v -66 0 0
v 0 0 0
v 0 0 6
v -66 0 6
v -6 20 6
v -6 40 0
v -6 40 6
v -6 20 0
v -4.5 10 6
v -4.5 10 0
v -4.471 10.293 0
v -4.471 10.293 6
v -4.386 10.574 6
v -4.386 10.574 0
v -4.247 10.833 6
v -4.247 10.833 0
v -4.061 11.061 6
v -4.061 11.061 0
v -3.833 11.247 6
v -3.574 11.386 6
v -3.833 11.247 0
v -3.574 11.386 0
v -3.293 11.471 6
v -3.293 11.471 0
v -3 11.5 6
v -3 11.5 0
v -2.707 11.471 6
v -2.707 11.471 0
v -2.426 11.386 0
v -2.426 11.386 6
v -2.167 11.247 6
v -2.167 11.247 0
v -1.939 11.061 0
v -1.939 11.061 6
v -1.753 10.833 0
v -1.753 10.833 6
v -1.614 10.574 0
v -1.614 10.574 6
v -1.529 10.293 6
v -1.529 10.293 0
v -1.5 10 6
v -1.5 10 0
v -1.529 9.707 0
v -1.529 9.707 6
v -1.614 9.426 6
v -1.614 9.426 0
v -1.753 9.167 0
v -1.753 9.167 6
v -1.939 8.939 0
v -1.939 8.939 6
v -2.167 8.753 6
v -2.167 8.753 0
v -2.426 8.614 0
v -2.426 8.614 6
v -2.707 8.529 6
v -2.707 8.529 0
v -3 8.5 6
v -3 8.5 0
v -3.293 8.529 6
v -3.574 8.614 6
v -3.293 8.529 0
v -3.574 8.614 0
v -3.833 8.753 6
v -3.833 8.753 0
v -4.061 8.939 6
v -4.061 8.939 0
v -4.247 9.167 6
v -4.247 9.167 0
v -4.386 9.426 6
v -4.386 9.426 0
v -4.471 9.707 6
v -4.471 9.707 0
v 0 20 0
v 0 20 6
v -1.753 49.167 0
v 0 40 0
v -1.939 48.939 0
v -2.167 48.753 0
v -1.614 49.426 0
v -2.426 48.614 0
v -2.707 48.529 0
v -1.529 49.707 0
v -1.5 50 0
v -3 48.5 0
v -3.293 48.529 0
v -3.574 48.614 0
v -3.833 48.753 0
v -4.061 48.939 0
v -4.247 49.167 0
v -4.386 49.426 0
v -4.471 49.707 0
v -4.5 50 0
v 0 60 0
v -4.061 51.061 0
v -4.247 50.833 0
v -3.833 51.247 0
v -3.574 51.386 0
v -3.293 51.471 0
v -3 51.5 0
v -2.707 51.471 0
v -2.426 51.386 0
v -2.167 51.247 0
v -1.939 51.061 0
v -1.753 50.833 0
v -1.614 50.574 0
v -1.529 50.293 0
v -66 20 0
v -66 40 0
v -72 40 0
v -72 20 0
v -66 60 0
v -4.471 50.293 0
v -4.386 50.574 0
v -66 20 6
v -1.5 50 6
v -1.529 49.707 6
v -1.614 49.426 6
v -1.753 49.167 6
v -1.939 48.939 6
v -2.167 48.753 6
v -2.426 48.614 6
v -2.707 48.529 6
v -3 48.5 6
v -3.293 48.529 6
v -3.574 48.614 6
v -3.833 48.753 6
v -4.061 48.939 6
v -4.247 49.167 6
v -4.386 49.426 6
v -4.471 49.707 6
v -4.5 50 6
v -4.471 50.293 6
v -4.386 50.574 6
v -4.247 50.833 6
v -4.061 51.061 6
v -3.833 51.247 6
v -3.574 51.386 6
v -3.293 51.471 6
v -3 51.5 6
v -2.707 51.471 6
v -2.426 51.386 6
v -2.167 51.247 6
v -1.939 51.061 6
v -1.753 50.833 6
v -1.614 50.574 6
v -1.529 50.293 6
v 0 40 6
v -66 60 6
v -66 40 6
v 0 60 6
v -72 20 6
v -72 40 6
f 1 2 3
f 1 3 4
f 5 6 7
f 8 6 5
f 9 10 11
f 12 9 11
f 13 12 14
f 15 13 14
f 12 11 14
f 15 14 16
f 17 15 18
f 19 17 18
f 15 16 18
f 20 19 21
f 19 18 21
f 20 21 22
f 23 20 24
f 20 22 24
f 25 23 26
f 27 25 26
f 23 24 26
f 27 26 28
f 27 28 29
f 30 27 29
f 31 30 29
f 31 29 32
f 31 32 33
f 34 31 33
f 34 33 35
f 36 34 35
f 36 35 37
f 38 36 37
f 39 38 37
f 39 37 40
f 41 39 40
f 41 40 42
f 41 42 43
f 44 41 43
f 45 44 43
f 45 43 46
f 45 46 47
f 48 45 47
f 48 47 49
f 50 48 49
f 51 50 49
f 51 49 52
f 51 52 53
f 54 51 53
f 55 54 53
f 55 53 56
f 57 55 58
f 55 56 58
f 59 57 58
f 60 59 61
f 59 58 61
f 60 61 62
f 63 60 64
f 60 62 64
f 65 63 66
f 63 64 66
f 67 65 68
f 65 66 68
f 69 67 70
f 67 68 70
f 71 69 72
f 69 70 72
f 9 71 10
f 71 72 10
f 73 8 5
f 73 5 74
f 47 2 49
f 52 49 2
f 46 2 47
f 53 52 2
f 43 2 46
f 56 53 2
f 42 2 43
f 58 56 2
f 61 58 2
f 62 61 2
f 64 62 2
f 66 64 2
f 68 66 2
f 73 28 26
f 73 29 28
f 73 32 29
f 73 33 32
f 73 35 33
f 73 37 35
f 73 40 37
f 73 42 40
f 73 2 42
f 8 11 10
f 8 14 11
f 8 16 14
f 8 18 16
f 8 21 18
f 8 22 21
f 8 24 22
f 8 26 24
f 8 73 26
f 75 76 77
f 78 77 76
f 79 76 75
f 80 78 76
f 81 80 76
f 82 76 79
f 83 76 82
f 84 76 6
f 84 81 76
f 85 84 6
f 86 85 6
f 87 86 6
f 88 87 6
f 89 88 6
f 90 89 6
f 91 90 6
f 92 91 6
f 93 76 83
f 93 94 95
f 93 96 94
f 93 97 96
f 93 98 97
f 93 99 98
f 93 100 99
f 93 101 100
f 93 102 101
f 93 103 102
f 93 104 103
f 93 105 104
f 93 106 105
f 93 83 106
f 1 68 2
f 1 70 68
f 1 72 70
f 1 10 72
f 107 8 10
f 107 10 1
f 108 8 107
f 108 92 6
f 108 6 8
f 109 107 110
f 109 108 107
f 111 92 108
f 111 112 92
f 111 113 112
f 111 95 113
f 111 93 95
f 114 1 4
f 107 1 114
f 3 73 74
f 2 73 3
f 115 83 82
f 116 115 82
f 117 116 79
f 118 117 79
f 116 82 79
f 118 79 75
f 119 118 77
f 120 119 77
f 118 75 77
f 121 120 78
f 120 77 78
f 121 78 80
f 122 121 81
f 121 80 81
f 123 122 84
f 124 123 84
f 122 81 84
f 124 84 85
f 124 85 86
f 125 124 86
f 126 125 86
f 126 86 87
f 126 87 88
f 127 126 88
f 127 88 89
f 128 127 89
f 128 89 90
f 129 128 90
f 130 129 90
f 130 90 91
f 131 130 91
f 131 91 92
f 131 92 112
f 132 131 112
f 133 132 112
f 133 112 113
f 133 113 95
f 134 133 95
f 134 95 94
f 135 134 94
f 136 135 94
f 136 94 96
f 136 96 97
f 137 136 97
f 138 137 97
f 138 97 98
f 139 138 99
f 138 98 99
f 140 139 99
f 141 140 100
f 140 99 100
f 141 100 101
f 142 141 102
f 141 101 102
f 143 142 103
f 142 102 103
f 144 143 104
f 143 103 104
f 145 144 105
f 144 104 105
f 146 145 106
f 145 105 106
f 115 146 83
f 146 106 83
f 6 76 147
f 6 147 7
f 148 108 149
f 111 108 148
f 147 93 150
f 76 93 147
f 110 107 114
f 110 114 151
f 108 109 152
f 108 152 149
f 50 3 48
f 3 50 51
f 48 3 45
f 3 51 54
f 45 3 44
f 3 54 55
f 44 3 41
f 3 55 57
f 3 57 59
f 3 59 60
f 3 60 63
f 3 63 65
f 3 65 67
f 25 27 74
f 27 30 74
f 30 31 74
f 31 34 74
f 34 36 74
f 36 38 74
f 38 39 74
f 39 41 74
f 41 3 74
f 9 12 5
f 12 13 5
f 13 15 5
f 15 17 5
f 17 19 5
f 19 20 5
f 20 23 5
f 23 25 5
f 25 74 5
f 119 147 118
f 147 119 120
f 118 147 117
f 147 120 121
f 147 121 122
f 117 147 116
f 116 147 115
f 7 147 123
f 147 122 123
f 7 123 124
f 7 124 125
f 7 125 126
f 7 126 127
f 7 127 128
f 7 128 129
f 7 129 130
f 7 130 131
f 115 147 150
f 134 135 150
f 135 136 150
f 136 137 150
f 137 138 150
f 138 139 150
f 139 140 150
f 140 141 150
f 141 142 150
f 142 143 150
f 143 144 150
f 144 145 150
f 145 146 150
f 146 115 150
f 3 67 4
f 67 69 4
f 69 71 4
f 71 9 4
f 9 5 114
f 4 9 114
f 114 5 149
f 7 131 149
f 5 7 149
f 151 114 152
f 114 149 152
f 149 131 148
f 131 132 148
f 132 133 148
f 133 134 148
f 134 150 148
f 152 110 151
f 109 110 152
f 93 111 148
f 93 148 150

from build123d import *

# Parameters (mm, degrees)
BOSS_EXTRU_1_DEPTH      = 6
ESQUISSE2_R             = 1.5
ENL_V_MAT_EXTRU_1_DEPTH = 94.914855055


with BuildPart() as part:
    # Esquisse1 → Boss.-Extru.1 (new body)
    with BuildSketch(Plane.XY):
        Polygon((0, 0), (-66, 0), (-66, 20), (-72, 20), (-72, 40), (-66, 40), (-66, 60), (0, 60), (0, 40), (-6, 40), (-6, 20), (0, 20), align=None)
    extrude(amount=BOSS_EXTRU_1_DEPTH)

    # Esquisse2 → Enlèv. mat.-Extru.1 (cut, through all)
    with BuildSketch(Plane(origin=(0, 0, 0), x_dir=(-1, 0, 0), z_dir=(0, 0, -1))):
        with Locations(Location((3, 50, 0), (0, 0, 180))):
            Circle(ESQUISSE2_R)
        with Locations((3, 10)):
            Circle(ESQUISSE2_R)
    extrude(amount=-ENL_V_MAT_EXTRU_1_DEPTH, mode=Mode.SUBTRACT)


solid = part.part
